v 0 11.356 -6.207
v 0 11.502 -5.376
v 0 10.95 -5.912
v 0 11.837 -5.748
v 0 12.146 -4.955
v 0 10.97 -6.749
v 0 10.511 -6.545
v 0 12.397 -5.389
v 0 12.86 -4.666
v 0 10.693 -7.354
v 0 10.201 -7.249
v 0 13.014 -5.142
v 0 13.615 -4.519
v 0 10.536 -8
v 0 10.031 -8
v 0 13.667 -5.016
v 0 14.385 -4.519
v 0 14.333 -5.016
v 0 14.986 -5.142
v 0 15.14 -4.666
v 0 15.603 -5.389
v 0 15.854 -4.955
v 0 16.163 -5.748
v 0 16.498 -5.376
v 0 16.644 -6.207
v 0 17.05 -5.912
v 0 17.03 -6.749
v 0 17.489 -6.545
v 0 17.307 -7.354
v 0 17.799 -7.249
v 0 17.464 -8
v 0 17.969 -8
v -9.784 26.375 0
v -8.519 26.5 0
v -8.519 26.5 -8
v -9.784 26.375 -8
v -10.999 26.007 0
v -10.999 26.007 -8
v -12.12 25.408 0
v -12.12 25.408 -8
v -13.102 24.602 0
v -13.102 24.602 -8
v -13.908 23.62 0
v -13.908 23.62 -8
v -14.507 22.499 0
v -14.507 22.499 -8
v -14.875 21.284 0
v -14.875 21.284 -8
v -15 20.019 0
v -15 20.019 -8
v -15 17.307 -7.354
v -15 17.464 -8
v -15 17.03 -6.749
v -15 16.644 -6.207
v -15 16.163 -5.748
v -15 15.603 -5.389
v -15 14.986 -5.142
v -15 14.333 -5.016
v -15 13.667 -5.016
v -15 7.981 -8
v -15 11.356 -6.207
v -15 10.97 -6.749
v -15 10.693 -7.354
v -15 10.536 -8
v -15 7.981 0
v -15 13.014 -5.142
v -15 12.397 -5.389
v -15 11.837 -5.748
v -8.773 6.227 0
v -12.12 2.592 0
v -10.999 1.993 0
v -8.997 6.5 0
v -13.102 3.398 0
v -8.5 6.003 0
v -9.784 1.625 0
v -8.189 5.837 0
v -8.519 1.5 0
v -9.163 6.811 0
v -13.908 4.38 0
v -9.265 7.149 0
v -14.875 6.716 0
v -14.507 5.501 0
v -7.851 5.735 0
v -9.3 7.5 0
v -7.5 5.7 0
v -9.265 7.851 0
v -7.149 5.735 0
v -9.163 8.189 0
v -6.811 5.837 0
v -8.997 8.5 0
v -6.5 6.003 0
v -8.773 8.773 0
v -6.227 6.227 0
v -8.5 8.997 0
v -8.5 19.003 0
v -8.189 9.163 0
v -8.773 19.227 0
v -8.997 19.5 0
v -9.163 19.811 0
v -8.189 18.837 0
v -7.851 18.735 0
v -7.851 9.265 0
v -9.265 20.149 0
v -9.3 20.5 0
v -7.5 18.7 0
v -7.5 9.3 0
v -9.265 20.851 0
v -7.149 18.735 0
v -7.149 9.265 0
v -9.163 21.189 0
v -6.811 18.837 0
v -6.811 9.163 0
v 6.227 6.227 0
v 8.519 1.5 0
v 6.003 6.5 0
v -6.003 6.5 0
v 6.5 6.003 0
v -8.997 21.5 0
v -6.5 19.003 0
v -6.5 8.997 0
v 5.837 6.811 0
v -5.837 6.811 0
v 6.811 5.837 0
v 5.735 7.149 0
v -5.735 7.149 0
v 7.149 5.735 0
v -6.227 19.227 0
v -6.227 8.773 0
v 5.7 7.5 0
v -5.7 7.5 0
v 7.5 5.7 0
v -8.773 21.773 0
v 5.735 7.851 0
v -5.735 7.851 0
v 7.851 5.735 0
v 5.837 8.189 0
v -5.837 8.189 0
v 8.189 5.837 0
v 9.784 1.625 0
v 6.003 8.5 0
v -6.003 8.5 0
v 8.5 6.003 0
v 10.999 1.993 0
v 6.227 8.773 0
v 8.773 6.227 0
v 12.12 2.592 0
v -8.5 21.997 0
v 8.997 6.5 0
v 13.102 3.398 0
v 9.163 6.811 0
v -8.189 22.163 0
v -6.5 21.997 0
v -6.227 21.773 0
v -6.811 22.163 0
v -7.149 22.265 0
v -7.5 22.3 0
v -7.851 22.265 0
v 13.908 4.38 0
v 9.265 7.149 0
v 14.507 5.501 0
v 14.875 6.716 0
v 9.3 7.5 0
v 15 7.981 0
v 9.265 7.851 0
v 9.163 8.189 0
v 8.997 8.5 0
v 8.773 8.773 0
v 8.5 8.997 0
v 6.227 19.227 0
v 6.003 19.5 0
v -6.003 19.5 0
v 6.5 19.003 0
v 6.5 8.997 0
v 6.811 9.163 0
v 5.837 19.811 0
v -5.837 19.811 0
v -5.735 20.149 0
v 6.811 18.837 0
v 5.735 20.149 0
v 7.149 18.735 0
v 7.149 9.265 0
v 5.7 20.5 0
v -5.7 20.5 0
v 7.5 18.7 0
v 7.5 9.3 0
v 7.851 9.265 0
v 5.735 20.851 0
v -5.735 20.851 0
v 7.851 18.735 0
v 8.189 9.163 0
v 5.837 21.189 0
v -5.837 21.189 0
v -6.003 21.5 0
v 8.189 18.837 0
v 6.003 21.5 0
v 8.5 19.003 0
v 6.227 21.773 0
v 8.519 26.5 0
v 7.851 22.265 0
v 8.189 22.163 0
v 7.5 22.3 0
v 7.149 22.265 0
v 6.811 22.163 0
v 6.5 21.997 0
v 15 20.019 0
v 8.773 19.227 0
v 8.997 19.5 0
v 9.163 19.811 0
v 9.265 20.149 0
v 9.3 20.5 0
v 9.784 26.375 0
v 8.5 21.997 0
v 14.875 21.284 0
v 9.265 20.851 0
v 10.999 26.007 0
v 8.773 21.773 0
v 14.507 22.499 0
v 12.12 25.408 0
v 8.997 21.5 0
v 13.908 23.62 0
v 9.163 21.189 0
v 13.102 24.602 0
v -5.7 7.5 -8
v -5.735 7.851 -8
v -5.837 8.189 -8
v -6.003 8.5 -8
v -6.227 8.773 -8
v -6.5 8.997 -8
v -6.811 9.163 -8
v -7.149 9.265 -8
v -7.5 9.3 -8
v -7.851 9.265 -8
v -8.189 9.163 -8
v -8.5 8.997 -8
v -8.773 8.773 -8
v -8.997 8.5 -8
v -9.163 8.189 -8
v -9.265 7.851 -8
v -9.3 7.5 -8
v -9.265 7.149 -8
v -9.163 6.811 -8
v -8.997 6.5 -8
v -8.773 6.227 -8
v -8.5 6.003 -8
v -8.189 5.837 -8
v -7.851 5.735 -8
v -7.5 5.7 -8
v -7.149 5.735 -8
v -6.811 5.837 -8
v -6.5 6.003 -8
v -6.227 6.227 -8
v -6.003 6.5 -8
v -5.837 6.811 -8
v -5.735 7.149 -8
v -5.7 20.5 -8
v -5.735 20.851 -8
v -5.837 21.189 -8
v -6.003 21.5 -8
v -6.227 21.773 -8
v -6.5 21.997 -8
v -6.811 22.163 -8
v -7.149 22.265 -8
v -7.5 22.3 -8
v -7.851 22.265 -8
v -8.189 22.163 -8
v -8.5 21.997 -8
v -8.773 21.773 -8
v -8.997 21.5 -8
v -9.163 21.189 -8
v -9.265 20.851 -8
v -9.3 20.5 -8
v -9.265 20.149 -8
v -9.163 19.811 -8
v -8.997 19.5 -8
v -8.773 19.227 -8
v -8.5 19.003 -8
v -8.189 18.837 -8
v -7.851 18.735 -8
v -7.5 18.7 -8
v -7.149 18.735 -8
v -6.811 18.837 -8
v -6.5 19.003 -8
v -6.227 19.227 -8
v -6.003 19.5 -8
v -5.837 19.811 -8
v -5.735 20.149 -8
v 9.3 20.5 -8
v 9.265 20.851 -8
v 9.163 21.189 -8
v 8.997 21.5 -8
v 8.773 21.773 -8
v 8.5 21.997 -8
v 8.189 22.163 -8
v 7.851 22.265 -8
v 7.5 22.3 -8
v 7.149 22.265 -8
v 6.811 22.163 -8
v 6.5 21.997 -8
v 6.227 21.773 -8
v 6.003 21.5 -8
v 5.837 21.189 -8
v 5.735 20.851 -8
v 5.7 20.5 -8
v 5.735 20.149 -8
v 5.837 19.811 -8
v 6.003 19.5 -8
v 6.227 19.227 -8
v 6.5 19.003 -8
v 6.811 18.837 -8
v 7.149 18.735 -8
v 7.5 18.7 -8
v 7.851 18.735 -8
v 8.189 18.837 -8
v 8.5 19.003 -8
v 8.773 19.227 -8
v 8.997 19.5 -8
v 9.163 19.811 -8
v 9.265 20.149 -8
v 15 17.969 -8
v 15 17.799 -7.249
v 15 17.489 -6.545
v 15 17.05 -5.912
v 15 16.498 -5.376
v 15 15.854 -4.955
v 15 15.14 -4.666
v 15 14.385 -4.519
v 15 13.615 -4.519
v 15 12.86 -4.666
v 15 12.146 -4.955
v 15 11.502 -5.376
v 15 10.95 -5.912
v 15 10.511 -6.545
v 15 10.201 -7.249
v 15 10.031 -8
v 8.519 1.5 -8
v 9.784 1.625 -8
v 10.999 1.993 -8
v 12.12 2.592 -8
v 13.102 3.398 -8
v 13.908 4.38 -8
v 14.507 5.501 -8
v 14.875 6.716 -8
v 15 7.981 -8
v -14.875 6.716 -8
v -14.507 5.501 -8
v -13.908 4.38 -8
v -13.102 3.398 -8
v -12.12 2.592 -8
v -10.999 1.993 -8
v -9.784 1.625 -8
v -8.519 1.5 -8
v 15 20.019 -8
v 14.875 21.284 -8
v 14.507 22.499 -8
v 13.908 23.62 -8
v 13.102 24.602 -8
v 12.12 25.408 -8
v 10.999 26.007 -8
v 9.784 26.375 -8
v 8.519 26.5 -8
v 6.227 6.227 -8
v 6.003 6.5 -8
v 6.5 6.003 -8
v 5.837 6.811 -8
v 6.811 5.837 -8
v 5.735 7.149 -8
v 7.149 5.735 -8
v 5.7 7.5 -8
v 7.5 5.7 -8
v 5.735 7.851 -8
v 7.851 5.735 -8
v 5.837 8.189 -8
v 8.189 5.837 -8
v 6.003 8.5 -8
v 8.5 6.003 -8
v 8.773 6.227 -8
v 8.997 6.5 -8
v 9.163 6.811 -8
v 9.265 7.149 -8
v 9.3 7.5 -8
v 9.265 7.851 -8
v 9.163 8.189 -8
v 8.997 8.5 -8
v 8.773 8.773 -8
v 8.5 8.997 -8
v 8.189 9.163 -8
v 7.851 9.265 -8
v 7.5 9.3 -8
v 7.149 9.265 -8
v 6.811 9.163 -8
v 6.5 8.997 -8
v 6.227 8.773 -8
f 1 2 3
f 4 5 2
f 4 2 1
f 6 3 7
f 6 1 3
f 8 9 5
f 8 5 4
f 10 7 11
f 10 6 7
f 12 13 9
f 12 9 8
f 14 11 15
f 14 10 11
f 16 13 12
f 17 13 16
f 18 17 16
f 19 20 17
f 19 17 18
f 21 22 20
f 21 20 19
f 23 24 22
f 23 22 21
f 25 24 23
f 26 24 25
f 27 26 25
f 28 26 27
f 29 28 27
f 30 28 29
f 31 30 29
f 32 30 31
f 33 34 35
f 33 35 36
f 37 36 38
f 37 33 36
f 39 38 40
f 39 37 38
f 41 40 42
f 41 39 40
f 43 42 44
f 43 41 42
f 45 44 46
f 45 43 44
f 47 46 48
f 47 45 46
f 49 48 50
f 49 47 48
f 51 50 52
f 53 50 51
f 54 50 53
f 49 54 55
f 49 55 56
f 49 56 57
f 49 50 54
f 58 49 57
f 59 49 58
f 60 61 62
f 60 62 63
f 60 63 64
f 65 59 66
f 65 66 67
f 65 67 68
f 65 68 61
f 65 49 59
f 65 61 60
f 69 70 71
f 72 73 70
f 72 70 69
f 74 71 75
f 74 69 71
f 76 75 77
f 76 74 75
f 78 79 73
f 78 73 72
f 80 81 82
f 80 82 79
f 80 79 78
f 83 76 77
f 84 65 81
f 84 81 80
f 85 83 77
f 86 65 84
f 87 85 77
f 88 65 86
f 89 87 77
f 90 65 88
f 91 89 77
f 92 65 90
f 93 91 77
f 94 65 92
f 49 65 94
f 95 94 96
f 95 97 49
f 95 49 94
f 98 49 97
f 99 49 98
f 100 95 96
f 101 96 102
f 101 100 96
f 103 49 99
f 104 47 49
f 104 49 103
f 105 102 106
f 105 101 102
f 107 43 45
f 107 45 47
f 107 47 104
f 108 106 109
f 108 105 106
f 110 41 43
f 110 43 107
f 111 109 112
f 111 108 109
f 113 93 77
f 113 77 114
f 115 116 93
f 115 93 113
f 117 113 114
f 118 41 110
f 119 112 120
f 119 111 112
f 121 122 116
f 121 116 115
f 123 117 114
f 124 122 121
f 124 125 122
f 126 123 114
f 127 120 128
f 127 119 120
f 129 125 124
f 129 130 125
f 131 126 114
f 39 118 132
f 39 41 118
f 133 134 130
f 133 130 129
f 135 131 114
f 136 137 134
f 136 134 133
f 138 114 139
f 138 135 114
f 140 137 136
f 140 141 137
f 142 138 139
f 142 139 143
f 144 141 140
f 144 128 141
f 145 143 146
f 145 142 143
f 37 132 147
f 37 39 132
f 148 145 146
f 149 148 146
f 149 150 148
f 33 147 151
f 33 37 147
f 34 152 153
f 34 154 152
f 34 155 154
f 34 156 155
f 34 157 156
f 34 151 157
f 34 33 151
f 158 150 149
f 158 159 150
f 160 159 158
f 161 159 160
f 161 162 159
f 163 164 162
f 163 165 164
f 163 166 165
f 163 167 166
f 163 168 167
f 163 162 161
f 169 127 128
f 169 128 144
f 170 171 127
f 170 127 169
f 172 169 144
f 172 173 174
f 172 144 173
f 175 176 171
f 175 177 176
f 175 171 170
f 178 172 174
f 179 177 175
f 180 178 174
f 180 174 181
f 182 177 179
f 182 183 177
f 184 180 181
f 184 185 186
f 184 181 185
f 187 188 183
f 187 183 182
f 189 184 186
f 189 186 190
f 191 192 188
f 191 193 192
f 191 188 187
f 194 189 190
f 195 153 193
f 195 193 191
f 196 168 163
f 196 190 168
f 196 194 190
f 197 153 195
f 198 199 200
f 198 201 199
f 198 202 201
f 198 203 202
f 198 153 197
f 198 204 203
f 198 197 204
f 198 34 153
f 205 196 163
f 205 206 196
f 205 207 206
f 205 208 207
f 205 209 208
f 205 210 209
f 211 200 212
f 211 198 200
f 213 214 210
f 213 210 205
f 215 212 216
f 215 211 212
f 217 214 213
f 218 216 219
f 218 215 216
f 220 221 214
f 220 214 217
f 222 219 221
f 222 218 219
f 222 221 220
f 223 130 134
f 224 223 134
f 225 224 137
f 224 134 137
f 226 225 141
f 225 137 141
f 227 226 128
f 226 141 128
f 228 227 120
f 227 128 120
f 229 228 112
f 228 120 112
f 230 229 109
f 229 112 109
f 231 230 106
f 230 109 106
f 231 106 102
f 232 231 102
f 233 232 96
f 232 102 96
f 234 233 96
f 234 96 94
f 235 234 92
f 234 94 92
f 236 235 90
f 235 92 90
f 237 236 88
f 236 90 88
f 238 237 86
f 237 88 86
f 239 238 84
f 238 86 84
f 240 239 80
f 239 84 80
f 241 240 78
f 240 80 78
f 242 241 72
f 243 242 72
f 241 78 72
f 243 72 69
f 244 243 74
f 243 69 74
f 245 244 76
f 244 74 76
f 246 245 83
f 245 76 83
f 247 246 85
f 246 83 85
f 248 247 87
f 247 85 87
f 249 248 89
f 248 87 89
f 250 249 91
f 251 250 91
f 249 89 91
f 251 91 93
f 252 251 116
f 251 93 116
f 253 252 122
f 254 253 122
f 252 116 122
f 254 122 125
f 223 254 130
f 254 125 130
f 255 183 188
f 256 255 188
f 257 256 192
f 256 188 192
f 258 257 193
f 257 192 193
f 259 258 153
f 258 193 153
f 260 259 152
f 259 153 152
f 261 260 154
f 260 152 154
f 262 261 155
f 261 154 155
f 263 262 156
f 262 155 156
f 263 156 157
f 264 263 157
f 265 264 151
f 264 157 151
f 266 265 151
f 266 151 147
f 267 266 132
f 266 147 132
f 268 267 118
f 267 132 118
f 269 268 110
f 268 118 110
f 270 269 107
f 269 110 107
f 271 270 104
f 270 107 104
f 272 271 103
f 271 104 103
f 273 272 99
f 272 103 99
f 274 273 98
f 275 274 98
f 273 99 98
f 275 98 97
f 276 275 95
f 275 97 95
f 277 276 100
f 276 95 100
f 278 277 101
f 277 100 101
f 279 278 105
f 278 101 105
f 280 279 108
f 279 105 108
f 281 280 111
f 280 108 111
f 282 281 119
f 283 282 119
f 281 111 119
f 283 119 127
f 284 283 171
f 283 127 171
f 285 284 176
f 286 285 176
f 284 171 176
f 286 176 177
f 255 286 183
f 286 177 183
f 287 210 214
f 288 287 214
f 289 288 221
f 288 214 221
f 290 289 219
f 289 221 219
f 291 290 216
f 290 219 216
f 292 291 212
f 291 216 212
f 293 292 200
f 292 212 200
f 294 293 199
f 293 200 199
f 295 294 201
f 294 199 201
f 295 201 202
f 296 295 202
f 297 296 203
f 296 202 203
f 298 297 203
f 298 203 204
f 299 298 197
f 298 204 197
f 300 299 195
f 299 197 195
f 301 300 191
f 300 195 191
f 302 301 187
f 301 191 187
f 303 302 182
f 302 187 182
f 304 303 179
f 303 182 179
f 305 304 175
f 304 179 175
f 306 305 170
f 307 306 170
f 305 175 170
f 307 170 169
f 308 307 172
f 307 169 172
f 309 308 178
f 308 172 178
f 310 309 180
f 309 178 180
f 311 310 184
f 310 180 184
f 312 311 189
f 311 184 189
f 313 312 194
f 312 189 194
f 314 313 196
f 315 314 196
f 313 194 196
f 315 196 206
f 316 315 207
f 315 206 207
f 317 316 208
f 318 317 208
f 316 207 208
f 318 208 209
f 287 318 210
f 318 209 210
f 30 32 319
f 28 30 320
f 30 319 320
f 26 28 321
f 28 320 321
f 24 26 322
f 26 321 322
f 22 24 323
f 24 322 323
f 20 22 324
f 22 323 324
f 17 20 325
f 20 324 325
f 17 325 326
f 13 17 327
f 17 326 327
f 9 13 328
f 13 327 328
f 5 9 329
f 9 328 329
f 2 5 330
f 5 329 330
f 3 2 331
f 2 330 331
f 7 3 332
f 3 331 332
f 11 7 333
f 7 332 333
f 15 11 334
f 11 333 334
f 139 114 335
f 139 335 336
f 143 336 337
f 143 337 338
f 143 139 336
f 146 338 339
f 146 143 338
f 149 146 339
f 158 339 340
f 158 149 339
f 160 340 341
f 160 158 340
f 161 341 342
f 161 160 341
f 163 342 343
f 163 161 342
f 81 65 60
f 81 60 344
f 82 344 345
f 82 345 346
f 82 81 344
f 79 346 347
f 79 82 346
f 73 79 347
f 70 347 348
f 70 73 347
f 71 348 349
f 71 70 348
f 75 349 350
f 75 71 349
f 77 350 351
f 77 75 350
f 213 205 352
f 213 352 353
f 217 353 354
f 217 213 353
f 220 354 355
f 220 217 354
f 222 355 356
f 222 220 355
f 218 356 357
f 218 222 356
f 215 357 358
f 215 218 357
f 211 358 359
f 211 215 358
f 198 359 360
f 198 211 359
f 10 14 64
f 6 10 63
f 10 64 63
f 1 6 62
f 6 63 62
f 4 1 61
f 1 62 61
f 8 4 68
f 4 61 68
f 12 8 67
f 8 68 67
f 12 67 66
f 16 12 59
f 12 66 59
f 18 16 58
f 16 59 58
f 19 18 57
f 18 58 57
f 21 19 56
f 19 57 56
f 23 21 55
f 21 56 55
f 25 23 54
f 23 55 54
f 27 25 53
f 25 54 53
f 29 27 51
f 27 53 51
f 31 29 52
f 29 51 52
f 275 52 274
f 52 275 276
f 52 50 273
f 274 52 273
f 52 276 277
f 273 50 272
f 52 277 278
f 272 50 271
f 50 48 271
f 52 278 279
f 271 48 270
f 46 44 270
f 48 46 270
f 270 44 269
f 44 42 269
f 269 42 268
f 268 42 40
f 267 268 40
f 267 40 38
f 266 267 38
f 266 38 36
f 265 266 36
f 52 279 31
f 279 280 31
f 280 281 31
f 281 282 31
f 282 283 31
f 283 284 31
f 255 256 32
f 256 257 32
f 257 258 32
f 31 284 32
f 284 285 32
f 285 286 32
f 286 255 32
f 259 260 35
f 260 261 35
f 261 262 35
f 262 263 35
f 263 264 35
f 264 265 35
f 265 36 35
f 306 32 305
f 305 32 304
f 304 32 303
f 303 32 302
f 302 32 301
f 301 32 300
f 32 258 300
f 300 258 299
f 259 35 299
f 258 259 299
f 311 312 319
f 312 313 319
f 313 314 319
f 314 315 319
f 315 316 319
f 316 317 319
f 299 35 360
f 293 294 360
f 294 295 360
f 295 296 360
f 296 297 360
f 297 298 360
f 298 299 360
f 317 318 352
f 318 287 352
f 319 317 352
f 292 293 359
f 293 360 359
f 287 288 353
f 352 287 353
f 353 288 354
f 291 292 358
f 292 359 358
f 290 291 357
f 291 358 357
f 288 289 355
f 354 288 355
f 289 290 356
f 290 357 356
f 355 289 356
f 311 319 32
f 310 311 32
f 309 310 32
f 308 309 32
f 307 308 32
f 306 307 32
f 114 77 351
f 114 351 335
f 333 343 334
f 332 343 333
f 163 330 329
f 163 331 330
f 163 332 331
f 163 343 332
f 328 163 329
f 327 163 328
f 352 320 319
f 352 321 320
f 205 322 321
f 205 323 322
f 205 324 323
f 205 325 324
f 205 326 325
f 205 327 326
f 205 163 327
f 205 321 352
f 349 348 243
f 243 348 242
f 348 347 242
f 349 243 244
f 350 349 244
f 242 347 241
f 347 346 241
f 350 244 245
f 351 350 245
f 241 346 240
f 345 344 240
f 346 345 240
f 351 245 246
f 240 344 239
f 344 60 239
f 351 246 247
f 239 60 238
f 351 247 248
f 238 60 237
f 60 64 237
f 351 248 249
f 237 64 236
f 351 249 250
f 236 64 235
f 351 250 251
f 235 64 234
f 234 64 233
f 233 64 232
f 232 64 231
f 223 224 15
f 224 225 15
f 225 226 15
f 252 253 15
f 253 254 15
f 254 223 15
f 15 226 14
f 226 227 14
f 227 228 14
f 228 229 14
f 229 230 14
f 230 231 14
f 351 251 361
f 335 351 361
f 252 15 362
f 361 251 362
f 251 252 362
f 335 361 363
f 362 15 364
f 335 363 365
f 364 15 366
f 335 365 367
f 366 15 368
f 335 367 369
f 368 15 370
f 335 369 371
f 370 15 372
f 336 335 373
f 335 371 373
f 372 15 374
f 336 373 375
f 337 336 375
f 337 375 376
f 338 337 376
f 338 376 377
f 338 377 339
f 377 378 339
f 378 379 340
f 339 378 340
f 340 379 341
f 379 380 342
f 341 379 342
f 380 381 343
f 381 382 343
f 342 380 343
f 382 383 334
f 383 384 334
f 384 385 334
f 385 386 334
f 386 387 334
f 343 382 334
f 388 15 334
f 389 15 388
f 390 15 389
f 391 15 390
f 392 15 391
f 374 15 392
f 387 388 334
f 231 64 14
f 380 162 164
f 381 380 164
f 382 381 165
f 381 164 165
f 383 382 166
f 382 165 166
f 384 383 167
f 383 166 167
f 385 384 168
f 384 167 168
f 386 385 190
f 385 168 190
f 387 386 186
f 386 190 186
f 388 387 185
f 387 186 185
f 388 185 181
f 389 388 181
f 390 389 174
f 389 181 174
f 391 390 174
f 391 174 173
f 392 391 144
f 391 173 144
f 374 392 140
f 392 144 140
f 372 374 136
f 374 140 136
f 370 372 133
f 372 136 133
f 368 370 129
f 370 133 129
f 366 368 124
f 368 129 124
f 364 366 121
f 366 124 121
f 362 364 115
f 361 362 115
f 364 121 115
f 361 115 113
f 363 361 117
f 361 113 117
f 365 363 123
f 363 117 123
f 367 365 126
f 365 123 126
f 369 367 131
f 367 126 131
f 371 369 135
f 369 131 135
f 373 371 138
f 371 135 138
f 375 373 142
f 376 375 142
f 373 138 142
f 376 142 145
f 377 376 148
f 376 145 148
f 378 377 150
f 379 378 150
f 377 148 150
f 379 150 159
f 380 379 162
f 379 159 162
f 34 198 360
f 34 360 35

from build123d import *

# Parameters (mm, degrees)
SKETCH1_R           = 1.8
BOSS_EXTRUDE1_DEPTH = 8
SKETCH2_R           = 3.5
CUT_EXTRUDE1_DEPTH  = 31
SKETCH3_R           = 4
CUT_EXTRUDE2_DEPTH  = 15


with BuildPart() as part:
    # Sketch1 → Boss-Extrude1 (new body)
    with BuildSketch(Plane.XY):
        with BuildLine():
            Line((8.519238, 26.5), (-8.519238, 26.5))
            ThreePointArc((-8.519238, 26.5), (-13.101828757, 24.601828757), (-15, 20.019238))
            Line((-15, 20.019238), (-15, 7.980762))
            ThreePointArc((-15, 7.980762), (-13.101828757, 3.398171243), (-8.519238, 1.5))
            Line((-8.519238, 1.5), (8.519238, 1.5))
            ThreePointArc((8.519238, 1.5), (13.101828757, 3.398171243), (15, 7.980762))
            Line((15, 7.980762), (15, 20.019238))
            ThreePointArc((15, 20.019238), (13.101828757, 24.601828757), (8.519238, 26.5))
        make_face()
        with Locations((7.500000742, 20.499999881)):
            Circle(SKETCH1_R, mode=Mode.SUBTRACT)
        with Locations((-7.500000742, 20.499999881)):
            Circle(SKETCH1_R, mode=Mode.SUBTRACT)
        with Locations((-7.500000742, 7.500000119)):
            Circle(SKETCH1_R, mode=Mode.SUBTRACT)
        with Locations((7.500000742, 7.500000119)):
            Circle(SKETCH1_R, mode=Mode.SUBTRACT)
    extrude(amount=-BOSS_EXTRUDE1_DEPTH)

    # Sketch2 → Cut-Extrude1 (cut, through all)
    with BuildSketch(Plane.ZY.offset(15)):
        with Locations((-8.499999447, 14)):
            Circle(SKETCH2_R)
    extrude(amount=-CUT_EXTRUDE1_DEPTH, mode=Mode.SUBTRACT)

    # Sketch3 → Cut-Extrude2 (cut)
    with BuildSketch(Plane(origin=(15, 0, 0), x_dir=(0, 0, -1), z_dir=(1, 0, 0))):
        with Locations((8.499999973, 14)):
            Circle(SKETCH3_R)
    extrude(amount=-CUT_EXTRUDE2_DEPTH, mode=Mode.SUBTRACT)


solid = part.part
